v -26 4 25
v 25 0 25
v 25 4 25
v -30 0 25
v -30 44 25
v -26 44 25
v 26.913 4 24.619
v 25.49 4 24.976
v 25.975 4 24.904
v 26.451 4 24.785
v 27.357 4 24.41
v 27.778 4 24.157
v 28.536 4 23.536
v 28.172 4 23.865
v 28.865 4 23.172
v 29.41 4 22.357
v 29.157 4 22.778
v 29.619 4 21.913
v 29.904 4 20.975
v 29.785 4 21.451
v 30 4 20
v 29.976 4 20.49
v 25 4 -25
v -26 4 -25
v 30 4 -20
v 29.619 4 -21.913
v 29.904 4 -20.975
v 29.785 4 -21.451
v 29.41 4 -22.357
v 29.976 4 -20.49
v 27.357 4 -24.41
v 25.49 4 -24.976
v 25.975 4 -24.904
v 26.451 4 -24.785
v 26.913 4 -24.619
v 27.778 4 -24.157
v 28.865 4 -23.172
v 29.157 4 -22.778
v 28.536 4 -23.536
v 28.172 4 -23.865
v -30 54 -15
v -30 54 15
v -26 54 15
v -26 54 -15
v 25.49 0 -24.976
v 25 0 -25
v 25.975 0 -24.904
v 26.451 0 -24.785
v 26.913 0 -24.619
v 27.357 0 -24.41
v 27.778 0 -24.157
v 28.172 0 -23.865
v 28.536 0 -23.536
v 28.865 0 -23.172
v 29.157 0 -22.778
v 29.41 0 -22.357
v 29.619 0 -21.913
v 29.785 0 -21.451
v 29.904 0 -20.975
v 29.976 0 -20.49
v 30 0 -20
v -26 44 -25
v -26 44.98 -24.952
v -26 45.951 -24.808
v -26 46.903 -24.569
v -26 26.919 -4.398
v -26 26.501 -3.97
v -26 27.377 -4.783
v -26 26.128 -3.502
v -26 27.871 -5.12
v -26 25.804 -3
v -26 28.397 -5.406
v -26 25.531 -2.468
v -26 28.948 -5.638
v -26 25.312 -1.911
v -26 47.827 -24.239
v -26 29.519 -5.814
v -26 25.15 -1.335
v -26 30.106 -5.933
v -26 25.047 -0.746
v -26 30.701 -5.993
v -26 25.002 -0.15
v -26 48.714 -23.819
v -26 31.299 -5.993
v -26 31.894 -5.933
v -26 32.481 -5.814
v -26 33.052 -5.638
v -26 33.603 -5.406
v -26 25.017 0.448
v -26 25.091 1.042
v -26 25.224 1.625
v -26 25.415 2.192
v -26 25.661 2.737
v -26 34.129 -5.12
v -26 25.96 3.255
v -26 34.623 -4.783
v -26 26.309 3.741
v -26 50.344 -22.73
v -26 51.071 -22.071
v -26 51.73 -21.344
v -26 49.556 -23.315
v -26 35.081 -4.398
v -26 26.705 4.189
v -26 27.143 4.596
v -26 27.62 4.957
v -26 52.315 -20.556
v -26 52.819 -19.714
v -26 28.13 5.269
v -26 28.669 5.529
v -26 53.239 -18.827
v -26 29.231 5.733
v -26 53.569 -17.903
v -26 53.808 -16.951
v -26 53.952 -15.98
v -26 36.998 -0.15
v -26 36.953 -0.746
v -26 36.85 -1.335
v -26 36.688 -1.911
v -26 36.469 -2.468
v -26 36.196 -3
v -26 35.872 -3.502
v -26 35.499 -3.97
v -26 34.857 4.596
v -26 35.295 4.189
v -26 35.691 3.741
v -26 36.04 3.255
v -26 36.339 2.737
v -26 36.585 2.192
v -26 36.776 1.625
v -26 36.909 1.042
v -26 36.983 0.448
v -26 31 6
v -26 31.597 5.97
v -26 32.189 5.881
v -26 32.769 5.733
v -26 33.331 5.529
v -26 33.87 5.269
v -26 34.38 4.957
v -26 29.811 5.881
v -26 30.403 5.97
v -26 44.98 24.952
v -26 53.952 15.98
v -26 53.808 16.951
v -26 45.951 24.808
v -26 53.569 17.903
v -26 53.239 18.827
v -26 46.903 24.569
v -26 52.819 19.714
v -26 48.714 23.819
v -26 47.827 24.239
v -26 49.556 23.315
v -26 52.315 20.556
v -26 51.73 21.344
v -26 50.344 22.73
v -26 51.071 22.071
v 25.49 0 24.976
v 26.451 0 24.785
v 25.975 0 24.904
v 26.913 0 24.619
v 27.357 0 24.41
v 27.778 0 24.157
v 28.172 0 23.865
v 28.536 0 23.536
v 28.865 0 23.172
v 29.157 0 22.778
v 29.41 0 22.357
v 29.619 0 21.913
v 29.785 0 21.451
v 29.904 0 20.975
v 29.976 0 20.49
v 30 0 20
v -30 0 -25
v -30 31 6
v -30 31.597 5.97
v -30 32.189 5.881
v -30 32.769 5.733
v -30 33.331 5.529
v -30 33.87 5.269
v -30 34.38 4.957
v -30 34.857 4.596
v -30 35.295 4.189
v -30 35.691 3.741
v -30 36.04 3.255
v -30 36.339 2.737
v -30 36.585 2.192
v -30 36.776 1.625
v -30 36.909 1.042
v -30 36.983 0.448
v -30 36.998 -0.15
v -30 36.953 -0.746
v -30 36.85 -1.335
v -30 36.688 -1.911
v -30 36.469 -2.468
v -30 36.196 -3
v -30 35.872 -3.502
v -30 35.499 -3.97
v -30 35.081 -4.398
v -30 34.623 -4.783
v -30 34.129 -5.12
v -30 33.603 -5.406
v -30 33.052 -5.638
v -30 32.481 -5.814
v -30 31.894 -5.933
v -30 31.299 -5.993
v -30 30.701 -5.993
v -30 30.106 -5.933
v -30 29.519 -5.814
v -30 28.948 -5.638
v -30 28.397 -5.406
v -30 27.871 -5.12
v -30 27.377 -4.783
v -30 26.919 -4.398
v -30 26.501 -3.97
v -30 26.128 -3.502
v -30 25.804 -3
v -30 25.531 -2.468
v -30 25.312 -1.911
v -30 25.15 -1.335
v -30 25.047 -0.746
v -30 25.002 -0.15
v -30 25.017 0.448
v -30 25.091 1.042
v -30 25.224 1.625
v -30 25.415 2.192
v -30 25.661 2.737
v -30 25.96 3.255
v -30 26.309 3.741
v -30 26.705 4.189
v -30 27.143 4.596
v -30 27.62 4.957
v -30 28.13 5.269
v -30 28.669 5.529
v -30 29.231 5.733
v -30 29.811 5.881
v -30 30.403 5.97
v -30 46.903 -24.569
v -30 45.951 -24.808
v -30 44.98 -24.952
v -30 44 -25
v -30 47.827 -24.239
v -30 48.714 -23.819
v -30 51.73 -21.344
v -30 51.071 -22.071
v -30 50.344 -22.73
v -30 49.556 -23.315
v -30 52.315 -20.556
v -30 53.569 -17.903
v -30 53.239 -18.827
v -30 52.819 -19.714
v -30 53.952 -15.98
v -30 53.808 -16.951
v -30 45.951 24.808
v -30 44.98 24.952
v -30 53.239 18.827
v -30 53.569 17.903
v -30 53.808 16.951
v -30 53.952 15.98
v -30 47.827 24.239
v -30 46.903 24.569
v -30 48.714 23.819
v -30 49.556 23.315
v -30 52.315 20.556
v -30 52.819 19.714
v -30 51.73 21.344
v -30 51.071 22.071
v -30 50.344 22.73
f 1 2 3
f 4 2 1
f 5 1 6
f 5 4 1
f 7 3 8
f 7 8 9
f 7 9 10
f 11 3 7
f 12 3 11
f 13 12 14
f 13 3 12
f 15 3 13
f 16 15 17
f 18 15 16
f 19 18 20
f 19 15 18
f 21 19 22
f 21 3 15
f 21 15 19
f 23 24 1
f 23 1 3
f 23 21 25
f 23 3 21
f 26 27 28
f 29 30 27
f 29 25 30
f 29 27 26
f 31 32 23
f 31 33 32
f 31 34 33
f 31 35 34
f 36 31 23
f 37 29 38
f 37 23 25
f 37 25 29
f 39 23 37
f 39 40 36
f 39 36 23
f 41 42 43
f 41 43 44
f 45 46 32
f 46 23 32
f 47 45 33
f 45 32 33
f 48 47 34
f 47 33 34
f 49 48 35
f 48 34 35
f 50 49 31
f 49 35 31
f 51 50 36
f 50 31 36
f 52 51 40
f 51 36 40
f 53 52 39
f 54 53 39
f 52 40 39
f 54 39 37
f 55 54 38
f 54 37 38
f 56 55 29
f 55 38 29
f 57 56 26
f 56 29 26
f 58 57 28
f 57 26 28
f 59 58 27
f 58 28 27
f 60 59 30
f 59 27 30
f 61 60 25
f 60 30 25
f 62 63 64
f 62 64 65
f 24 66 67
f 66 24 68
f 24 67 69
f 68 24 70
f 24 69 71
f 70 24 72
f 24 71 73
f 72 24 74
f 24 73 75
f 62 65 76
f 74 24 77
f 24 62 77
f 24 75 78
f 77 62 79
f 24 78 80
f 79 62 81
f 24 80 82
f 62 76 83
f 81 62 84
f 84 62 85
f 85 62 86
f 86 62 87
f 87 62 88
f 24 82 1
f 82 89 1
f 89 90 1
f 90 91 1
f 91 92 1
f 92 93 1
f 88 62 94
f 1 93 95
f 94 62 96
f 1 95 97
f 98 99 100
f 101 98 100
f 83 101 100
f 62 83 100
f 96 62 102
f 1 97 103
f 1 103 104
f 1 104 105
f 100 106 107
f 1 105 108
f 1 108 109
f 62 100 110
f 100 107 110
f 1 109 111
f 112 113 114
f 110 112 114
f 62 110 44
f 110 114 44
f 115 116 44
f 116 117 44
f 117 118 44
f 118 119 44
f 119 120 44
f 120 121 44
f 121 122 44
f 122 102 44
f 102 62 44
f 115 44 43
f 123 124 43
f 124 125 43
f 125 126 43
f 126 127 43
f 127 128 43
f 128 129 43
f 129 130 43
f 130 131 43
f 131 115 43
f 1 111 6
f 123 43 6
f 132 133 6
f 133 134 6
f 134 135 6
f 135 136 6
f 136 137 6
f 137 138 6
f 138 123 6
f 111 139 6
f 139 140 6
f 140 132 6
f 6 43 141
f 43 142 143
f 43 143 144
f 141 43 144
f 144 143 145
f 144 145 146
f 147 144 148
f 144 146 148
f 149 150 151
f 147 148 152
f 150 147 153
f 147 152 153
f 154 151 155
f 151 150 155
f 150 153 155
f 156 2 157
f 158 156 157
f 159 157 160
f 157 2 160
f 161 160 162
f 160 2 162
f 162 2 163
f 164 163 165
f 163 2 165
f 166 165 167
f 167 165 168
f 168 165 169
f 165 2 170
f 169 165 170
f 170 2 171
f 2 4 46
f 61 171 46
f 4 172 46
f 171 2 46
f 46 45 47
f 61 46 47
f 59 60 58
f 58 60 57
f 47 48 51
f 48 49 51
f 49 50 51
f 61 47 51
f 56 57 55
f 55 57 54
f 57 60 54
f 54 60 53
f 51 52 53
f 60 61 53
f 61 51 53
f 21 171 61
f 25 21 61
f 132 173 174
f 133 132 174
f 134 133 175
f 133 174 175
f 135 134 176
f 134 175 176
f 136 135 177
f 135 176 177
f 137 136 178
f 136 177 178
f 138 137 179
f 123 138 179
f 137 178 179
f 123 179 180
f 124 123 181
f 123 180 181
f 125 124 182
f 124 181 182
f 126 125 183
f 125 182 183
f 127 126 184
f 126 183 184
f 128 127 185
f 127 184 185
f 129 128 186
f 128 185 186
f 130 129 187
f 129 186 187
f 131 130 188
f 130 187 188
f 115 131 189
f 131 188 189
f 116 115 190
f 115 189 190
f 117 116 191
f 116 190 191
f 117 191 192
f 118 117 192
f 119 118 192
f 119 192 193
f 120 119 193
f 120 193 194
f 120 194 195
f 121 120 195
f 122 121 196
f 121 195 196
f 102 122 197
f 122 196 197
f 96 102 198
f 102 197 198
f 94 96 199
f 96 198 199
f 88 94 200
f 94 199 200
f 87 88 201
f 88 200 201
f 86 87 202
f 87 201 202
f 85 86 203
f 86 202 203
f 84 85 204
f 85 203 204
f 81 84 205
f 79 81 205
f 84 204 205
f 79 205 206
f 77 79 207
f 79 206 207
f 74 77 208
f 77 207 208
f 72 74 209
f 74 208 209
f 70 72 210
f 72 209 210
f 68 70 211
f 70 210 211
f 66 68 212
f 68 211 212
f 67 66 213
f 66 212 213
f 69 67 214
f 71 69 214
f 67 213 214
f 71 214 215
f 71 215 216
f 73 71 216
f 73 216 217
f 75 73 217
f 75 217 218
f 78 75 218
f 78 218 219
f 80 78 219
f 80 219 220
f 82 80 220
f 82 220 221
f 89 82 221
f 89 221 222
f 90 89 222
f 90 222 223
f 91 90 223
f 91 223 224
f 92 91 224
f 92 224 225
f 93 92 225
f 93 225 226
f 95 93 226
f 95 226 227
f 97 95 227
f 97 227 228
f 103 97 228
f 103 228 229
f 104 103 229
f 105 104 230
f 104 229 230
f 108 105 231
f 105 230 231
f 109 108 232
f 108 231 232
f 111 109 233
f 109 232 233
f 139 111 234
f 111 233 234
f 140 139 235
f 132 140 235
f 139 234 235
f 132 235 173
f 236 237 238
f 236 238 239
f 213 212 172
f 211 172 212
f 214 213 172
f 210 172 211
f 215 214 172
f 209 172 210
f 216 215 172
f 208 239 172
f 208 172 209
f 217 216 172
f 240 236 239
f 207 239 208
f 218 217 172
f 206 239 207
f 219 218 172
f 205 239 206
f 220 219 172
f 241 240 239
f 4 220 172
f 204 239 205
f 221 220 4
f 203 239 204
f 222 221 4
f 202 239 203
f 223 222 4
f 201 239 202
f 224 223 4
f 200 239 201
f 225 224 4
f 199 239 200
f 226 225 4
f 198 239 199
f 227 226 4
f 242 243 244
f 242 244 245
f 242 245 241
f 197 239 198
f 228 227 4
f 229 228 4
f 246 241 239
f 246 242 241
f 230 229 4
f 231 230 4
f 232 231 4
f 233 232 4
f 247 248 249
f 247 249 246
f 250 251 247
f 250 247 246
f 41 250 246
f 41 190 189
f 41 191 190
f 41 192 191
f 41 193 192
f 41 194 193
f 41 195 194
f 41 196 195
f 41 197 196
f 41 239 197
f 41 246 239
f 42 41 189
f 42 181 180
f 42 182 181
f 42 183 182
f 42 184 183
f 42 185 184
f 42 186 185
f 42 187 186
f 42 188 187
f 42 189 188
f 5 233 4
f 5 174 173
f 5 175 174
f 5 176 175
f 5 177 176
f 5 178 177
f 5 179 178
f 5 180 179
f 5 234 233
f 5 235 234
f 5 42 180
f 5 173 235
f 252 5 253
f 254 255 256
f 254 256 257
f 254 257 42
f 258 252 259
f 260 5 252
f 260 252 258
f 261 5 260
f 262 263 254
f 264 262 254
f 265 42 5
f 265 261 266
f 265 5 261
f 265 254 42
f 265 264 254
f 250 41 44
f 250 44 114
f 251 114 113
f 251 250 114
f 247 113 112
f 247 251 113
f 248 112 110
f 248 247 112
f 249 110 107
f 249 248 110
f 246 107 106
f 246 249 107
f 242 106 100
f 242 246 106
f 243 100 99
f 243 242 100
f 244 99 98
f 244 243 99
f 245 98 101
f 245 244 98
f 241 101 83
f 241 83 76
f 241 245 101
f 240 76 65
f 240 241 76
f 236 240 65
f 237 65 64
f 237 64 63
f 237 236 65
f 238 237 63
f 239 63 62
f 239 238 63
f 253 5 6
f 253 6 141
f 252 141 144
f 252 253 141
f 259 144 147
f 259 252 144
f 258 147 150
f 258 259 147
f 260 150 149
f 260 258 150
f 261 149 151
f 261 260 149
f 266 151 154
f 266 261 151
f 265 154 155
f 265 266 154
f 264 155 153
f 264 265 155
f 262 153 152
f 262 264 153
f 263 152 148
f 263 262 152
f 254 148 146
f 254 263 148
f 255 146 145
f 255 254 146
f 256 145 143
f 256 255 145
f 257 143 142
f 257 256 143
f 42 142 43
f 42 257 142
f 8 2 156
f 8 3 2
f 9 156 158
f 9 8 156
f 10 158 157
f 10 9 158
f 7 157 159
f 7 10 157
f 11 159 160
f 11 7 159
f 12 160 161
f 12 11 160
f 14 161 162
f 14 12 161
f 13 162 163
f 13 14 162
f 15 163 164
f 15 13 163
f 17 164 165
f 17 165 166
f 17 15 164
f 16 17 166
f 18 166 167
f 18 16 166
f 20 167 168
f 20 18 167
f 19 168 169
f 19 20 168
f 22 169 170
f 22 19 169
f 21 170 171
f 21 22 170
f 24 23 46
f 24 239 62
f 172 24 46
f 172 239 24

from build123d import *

# Parameters (mm, degrees)
SKETCH1_W           = 60
SKETCH1_H           = 50
BOSS_EXTRUDE3_DEPTH = 4
SKETCH3_R           = 6
BOSS_EXTRUDE4_DEPTH = 4
FILLET1_R           = 5


with BuildPart() as part:
    # Sketch1 → Boss-Extrude3 (new body)
    with BuildSketch(Plane(origin=(0, 0, 0), x_dir=(1, 0, 0), z_dir=(0, 1, 0))):
        Rectangle(SKETCH1_W, SKETCH1_H)
    extrude(amount=BOSS_EXTRUDE3_DEPTH)

    # Sketch3 → Boss-Extrude4 (add)
    with BuildSketch(Plane.ZY.offset(30)):
        with BuildLine():
            Line((-25, 4), (25, 4))
            Line((25, 4), (25, 44))
            ThreePointArc((25, 44), (22.071067812, 51.071067812), (15, 54))
            Line((15, 54), (-15, 54))
            ThreePointArc((-15, 54), (-22.071067812, 51.071067812), (-25, 44))
            Line((-25, 44), (-25, 4))
        make_face()
        with Locations((0, 31)):
            Circle(SKETCH3_R, mode=Mode.SUBTRACT)
    extrude(amount=-BOSS_EXTRUDE4_DEPTH)

    # Fillet1
    fillet1_edges = [part.edges().sort_by_distance(p)[0] for p in [
        (30, 2, 25),
        (30, 2, -25),
    ]]
    fillet(fillet1_edges, radius=FILLET1_R)


solid = part.part
